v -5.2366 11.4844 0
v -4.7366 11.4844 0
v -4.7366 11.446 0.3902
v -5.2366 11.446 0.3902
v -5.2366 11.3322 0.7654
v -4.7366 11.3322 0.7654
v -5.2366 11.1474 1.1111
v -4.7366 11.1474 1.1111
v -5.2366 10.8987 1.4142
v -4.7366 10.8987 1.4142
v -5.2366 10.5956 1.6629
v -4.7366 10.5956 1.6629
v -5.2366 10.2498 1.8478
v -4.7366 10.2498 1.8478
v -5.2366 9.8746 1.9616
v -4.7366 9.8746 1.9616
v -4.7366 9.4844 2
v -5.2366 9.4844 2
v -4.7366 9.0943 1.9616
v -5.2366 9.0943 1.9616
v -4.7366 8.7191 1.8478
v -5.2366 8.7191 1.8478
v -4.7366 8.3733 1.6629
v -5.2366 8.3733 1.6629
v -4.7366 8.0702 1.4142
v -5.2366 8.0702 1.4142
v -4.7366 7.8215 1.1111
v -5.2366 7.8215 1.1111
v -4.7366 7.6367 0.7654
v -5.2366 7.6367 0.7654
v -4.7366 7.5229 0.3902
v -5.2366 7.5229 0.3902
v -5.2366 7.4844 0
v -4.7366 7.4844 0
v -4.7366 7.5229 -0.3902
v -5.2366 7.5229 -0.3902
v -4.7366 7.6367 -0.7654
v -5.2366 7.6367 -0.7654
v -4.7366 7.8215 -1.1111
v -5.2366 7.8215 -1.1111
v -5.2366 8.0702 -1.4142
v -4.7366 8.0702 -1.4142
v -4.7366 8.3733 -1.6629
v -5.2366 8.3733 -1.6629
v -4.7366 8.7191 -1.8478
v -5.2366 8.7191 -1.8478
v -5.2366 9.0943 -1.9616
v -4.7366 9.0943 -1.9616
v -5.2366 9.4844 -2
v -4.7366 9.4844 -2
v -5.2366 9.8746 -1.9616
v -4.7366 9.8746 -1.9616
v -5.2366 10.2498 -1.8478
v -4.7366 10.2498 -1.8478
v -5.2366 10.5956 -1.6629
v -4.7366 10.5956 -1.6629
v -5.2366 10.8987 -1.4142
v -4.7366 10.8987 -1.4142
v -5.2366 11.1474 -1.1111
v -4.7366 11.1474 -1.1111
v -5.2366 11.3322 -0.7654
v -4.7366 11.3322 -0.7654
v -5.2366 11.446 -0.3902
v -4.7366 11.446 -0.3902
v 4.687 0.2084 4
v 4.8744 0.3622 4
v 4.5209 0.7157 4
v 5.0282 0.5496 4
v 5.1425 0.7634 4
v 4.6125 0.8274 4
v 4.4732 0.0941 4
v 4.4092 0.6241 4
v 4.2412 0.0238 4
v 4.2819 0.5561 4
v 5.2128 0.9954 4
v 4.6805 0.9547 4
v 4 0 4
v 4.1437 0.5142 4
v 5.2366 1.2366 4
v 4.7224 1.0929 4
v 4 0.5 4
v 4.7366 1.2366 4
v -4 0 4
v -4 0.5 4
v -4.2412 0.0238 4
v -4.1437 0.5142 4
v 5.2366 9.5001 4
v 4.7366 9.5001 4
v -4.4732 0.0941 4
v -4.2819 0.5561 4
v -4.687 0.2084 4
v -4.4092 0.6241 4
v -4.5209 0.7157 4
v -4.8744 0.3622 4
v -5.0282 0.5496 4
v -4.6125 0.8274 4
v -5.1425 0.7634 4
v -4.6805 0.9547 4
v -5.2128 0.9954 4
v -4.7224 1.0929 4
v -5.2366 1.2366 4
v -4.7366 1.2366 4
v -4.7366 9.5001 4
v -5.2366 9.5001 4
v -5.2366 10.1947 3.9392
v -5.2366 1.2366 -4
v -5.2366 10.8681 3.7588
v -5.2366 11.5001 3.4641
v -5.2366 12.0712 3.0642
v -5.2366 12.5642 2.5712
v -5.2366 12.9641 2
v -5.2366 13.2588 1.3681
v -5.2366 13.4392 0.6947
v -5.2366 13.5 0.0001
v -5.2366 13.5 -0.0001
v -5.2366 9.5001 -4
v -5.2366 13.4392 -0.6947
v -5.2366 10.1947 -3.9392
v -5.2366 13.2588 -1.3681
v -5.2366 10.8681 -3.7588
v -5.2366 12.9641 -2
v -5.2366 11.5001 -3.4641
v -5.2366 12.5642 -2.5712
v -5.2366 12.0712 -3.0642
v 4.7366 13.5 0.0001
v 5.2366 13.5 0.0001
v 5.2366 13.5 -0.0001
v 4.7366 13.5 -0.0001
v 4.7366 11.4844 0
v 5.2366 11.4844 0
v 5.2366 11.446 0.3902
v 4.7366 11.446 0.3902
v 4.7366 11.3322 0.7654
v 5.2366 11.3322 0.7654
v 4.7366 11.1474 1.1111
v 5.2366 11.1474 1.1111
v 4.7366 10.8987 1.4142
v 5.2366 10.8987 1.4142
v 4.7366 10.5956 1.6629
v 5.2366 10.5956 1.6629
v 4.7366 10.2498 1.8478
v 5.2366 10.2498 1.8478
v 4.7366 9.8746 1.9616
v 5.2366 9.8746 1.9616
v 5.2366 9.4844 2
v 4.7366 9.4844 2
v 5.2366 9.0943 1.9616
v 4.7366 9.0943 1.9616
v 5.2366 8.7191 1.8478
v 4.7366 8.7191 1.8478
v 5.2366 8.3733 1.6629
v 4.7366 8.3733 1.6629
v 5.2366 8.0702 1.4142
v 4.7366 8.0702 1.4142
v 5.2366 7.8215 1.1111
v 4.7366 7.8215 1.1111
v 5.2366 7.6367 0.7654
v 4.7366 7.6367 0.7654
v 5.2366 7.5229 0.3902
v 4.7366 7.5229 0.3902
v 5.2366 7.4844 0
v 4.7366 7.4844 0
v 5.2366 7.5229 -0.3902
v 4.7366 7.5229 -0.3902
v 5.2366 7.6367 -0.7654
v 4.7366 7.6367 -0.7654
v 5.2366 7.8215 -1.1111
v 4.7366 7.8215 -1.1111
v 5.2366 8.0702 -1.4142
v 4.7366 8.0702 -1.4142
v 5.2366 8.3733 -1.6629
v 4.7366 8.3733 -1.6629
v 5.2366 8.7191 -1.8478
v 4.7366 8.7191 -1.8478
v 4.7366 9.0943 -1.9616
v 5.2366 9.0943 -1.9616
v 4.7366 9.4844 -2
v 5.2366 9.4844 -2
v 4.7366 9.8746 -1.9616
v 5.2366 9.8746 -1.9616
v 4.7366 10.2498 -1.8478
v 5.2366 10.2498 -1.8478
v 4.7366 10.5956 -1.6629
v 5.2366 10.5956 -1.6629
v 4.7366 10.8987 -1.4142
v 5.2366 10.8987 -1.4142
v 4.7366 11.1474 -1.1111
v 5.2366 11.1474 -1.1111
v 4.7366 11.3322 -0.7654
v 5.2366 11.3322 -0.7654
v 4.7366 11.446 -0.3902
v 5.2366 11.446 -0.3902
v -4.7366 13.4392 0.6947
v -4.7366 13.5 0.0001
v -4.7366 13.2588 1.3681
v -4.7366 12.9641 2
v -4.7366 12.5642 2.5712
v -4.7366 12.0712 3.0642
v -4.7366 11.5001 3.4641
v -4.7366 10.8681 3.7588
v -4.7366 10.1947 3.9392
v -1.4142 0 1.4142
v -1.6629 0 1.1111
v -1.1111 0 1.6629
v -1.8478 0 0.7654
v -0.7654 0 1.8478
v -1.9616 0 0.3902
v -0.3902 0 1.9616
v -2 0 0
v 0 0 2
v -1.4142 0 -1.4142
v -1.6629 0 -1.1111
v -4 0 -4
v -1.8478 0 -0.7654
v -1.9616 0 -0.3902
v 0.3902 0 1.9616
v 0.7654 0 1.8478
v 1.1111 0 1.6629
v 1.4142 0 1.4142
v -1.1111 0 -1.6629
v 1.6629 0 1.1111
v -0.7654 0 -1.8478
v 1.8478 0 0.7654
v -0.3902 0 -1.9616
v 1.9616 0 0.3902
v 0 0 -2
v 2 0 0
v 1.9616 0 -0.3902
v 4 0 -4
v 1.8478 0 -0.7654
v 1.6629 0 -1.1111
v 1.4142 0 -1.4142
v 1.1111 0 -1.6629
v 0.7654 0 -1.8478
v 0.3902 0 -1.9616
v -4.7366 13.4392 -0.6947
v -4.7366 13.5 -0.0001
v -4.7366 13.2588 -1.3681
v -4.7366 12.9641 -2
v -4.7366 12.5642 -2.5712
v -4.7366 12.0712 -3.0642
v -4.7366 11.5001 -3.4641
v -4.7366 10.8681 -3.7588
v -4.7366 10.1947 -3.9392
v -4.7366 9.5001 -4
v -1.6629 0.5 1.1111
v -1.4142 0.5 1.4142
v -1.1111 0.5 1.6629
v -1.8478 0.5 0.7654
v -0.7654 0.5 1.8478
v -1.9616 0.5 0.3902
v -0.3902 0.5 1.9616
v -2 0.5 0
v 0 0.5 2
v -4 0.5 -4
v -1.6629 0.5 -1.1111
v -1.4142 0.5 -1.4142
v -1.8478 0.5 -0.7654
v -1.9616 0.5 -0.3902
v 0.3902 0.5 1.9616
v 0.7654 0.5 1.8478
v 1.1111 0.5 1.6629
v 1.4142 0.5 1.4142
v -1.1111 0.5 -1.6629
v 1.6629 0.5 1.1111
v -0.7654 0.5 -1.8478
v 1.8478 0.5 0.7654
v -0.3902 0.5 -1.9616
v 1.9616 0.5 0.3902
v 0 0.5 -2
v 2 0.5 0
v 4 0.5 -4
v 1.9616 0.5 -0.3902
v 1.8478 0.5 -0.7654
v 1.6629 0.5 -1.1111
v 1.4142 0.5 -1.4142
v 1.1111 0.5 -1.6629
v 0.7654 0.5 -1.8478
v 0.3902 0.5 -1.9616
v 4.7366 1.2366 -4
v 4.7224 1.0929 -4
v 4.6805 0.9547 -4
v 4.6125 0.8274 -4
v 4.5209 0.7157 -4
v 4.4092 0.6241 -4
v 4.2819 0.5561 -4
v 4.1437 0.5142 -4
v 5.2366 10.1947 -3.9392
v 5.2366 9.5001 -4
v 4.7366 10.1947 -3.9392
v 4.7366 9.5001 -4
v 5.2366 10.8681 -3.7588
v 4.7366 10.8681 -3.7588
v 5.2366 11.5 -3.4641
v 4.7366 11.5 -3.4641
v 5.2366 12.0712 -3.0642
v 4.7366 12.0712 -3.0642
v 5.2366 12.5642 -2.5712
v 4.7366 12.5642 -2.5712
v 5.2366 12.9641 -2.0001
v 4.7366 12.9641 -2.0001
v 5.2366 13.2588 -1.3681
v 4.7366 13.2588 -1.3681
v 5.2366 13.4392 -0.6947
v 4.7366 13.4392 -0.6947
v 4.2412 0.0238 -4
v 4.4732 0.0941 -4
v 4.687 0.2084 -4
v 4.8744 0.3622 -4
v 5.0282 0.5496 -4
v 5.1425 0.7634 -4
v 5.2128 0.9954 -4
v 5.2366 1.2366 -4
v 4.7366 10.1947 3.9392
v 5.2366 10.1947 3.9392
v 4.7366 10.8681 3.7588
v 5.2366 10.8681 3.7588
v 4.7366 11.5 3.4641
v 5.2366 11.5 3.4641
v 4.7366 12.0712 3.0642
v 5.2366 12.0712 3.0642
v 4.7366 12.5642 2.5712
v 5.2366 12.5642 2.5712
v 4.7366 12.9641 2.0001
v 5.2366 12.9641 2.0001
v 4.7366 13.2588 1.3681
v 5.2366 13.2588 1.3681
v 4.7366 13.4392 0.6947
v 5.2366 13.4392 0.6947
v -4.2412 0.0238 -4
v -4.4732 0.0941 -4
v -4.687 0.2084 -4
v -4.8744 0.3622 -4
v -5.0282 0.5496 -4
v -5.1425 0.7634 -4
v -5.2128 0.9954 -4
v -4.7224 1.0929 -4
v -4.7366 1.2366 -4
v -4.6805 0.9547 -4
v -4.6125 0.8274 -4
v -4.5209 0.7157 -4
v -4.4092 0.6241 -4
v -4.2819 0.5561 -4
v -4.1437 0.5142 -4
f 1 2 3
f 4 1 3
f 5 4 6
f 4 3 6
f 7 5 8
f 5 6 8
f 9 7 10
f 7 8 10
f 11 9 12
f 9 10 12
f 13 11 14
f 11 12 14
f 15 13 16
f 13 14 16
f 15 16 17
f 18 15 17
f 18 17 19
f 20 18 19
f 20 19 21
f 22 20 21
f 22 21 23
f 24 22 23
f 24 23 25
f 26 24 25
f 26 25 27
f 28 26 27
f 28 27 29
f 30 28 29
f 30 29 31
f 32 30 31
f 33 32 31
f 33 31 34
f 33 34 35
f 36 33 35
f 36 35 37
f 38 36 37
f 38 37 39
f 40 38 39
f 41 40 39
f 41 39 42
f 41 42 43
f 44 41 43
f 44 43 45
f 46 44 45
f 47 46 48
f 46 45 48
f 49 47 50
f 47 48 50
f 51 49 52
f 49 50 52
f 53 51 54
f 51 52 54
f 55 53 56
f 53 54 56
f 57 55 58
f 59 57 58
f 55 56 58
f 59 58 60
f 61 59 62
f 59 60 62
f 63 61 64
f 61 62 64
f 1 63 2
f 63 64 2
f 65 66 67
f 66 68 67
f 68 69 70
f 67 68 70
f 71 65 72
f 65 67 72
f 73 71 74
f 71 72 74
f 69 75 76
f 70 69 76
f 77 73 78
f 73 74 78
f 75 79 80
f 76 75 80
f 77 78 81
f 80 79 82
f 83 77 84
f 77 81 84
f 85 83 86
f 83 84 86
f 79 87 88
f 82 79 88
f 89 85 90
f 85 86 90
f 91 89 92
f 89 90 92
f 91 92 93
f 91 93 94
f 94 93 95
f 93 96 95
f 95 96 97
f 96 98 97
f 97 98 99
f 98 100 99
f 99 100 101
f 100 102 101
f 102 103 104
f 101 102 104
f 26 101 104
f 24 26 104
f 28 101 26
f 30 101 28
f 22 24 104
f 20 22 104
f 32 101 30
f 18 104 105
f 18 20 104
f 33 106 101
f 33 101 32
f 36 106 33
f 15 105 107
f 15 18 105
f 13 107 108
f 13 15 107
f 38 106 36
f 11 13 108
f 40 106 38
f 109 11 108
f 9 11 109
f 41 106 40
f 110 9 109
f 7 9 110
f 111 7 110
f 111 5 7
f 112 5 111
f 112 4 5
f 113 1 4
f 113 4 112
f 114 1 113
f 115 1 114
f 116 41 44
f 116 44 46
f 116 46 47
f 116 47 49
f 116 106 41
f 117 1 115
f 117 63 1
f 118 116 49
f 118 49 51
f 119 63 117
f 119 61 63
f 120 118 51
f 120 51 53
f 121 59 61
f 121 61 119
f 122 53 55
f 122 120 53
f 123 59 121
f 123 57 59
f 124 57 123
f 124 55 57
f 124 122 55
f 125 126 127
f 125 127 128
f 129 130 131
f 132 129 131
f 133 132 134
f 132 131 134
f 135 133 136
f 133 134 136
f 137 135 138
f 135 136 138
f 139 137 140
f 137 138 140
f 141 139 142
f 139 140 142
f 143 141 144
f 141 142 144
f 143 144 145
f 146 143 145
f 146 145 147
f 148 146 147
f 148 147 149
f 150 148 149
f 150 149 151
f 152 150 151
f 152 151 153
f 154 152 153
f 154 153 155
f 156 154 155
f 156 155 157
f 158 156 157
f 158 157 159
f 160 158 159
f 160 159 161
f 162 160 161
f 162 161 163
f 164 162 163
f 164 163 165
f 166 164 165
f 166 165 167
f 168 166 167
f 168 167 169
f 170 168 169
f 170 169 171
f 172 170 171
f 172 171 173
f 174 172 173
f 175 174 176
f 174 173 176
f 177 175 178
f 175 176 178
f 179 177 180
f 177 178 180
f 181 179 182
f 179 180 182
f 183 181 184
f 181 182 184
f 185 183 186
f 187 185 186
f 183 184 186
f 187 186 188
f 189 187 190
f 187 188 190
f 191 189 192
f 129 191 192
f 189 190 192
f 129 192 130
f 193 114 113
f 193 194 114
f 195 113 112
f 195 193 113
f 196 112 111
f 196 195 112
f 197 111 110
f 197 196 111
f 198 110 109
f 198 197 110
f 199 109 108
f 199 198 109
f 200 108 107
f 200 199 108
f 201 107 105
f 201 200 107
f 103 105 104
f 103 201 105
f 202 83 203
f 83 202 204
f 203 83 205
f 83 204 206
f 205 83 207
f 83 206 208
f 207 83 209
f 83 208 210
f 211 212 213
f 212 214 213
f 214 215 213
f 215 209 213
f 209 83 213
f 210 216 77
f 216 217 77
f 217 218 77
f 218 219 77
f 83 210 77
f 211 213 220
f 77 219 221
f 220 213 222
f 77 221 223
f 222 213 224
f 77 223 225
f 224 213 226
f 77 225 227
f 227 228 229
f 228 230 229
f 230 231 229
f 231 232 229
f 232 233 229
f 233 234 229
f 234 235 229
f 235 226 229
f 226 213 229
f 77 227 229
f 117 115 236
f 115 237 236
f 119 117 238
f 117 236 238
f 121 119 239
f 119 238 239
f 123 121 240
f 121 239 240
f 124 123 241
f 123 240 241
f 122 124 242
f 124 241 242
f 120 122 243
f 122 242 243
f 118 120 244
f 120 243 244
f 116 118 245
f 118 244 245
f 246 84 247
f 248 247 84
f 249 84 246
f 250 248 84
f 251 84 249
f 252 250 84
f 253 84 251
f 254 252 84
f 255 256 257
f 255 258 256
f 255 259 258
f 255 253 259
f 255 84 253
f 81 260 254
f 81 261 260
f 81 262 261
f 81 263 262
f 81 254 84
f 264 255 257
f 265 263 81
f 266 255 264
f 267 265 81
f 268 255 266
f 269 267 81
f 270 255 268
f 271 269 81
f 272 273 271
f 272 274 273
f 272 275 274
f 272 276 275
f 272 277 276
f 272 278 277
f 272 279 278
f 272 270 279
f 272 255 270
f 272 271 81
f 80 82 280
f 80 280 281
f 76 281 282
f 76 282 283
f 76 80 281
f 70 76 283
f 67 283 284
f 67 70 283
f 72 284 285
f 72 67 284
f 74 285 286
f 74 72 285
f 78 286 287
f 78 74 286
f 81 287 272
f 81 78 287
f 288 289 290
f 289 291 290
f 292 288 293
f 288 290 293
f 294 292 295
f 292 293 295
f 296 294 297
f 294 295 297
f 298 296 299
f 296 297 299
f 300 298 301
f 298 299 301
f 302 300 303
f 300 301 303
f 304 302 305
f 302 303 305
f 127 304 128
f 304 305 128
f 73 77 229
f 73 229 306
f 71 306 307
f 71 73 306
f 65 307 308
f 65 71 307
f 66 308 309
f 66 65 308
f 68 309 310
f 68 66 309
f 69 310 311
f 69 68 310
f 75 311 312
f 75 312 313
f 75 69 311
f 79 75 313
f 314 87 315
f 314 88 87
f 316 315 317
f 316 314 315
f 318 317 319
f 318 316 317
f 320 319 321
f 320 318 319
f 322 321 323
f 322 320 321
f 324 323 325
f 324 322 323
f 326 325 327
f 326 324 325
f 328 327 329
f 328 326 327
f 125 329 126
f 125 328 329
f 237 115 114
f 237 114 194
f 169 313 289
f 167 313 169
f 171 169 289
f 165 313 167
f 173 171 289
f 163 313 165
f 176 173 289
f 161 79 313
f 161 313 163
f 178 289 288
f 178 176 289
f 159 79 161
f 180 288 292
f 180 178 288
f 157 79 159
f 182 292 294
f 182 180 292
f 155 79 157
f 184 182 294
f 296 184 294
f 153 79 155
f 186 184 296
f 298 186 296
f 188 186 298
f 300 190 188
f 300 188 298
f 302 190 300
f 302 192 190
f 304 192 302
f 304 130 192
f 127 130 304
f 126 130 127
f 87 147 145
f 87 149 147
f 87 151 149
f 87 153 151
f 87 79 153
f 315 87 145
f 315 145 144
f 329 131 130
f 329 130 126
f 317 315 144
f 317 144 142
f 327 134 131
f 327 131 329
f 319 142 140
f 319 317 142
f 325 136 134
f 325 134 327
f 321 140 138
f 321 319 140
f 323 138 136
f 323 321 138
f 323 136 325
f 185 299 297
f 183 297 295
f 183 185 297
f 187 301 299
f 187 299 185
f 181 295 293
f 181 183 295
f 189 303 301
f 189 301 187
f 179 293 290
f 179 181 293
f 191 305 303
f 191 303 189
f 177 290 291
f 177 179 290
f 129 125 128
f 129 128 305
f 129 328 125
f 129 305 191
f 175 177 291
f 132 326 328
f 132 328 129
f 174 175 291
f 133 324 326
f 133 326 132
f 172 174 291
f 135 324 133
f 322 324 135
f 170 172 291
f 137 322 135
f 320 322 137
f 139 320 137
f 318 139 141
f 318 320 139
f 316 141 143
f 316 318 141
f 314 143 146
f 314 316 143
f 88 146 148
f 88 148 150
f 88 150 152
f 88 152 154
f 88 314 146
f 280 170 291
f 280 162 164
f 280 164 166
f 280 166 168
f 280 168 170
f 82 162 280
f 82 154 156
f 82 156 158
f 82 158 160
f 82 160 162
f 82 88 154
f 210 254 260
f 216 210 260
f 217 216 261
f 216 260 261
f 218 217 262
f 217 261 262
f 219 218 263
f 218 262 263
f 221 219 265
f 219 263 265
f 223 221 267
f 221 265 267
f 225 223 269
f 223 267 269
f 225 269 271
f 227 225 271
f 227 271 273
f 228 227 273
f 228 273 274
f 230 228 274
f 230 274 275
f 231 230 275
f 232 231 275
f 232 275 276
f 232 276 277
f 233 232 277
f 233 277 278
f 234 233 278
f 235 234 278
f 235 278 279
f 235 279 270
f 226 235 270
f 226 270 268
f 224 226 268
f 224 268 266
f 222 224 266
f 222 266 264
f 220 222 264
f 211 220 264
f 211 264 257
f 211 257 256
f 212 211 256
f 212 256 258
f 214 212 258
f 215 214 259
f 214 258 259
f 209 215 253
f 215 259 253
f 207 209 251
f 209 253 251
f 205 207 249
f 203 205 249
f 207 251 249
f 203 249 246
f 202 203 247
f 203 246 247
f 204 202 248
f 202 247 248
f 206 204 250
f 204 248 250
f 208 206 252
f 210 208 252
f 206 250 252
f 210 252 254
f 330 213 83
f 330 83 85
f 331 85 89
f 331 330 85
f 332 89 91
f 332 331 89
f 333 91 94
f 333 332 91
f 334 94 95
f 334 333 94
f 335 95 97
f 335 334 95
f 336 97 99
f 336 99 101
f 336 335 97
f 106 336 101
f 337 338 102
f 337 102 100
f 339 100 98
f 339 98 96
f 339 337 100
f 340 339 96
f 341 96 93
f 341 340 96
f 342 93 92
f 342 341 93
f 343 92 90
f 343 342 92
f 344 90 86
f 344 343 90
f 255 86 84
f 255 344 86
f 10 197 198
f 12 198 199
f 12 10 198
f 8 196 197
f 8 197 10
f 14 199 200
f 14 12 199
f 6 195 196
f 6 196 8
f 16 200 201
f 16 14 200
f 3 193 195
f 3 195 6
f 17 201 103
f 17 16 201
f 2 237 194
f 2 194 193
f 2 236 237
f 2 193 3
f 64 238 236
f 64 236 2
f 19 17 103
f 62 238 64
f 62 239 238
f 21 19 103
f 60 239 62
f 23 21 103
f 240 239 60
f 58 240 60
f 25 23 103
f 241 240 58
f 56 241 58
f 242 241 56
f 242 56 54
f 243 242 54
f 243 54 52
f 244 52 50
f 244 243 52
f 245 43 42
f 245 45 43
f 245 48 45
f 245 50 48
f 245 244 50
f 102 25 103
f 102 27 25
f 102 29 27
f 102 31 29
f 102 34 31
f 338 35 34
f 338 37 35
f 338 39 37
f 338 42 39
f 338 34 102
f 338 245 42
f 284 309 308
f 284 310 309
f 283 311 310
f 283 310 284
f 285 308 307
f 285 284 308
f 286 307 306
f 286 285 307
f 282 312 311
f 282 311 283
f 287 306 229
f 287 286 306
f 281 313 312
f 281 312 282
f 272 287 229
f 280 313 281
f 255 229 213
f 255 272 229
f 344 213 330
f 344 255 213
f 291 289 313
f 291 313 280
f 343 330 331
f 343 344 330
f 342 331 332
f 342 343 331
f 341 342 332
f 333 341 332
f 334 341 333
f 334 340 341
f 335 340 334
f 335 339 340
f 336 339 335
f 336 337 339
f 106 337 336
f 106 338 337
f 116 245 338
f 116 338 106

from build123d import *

# Parameters (mm, degrees)
SKETCH1_W          = 8
SKETCH1_H          = 8
BASE_FLANGE1_DEPTH = 0.5
EDGE_FLANGE1_DEPTH = 8
EDGE_FLANGE2_DEPTH = 8
FILLET1_R          = 4
SKETCH12_R         = 2
CUT_EXTRUDE1_DEPTH = 15.574703412
SKETCH13_R         = 2
CUT_EXTRUDE2_DEPTH = 18.548159967


# Sheet-metal steps are written as plain solids
with BuildPart() as part:
    # Sketch1 → Base-Flange1 (new body)
    with BuildSketch(Plane(origin=(0, 0, 0), x_dir=(1, 0, 0), z_dir=(0, 1, 0))):
        Rectangle(SKETCH1_W, SKETCH1_H)
    extrude(amount=BASE_FLANGE1_DEPTH)

    # Edge-Flange1 section (across the edge) → Edge-Flange1 (add)
    with BuildSketch(Plane(origin=(4.7366, 0.5, 4), x_dir=(-1, 0, 0), z_dir=(0, 0, -1))):
        with BuildLine():
            Line((-0.5, 0.7366), (-0.5, 13))
            Line((-0.5, 13), (0, 13))
            Line((0, 13), (0, 0.7366))
            ThreePointArc((0, 0.7366), (0.215745145, 0.215745145), (0.7366, 0))
            Line((0.7366, 0), (0.7366, -0.5))
            ThreePointArc((0.7366, -0.5), (-0.137808246, -0.137808246), (-0.5, 0.7366))
        make_face()
    extrude(amount=EDGE_FLANGE1_DEPTH)

    # Edge-Flange2 section (across the edge) → Edge-Flange2 (add)
    with BuildSketch(Plane(origin=(-4.7366, 0.5, -4), x_dir=(1, 0, 0), z_dir=(0, 0, 1))):
        with BuildLine():
            Line((-0.5, 0.7366), (-0.5, 13))
            Line((-0.5, 13), (0, 13))
            Line((0, 13), (0, 0.7366))
            ThreePointArc((0, 0.7366), (0.215745145, 0.215745145), (0.7366, 0))
            Line((0.7366, 0), (0.7366, -0.5))
            ThreePointArc((0.7366, -0.5), (-0.137808246, -0.137808246), (-0.5, 0.7366))
        make_face()
    extrude(amount=EDGE_FLANGE2_DEPTH)

    # Fillet1
    fillet1_edges = [part.edges().sort_by_distance(p)[0] for p in [
        (4.9866, 13.5, -4),
        (-4.9866, 13.5, -4),
        (4.9866, 13.5, 4),
        (-4.9866, 13.5, 4),
    ]]
    fillet(fillet1_edges, radius=FILLET1_R - 0.0001)  # a hair under: the kernel refuses the full size

    # Sketch12 → Cut-Extrude1 (cut, through all)
    with BuildSketch(Plane(origin=(0, 0.5, 0), x_dir=(1, 0, 0), z_dir=(0, 1, 0))):
        with Locations(Location((0, 0, 0), (0, 0, 270))):
            Circle(SKETCH12_R)
    extrude(amount=-CUT_EXTRUDE1_DEPTH, mode=Mode.SUBTRACT)

    # Sketch13 → Cut-Extrude2 (cut, through all)
    with BuildSketch(Plane(origin=(5.2366, 0, 0), x_dir=(0, 0, -1), z_dir=(1, 0, 0))):
        with Locations(Location((0, 9.484444929, 0), (0, 0, 90))):
            Circle(SKETCH13_R)
    extrude(amount=-CUT_EXTRUDE2_DEPTH, mode=Mode.SUBTRACT)


solid = part.part
